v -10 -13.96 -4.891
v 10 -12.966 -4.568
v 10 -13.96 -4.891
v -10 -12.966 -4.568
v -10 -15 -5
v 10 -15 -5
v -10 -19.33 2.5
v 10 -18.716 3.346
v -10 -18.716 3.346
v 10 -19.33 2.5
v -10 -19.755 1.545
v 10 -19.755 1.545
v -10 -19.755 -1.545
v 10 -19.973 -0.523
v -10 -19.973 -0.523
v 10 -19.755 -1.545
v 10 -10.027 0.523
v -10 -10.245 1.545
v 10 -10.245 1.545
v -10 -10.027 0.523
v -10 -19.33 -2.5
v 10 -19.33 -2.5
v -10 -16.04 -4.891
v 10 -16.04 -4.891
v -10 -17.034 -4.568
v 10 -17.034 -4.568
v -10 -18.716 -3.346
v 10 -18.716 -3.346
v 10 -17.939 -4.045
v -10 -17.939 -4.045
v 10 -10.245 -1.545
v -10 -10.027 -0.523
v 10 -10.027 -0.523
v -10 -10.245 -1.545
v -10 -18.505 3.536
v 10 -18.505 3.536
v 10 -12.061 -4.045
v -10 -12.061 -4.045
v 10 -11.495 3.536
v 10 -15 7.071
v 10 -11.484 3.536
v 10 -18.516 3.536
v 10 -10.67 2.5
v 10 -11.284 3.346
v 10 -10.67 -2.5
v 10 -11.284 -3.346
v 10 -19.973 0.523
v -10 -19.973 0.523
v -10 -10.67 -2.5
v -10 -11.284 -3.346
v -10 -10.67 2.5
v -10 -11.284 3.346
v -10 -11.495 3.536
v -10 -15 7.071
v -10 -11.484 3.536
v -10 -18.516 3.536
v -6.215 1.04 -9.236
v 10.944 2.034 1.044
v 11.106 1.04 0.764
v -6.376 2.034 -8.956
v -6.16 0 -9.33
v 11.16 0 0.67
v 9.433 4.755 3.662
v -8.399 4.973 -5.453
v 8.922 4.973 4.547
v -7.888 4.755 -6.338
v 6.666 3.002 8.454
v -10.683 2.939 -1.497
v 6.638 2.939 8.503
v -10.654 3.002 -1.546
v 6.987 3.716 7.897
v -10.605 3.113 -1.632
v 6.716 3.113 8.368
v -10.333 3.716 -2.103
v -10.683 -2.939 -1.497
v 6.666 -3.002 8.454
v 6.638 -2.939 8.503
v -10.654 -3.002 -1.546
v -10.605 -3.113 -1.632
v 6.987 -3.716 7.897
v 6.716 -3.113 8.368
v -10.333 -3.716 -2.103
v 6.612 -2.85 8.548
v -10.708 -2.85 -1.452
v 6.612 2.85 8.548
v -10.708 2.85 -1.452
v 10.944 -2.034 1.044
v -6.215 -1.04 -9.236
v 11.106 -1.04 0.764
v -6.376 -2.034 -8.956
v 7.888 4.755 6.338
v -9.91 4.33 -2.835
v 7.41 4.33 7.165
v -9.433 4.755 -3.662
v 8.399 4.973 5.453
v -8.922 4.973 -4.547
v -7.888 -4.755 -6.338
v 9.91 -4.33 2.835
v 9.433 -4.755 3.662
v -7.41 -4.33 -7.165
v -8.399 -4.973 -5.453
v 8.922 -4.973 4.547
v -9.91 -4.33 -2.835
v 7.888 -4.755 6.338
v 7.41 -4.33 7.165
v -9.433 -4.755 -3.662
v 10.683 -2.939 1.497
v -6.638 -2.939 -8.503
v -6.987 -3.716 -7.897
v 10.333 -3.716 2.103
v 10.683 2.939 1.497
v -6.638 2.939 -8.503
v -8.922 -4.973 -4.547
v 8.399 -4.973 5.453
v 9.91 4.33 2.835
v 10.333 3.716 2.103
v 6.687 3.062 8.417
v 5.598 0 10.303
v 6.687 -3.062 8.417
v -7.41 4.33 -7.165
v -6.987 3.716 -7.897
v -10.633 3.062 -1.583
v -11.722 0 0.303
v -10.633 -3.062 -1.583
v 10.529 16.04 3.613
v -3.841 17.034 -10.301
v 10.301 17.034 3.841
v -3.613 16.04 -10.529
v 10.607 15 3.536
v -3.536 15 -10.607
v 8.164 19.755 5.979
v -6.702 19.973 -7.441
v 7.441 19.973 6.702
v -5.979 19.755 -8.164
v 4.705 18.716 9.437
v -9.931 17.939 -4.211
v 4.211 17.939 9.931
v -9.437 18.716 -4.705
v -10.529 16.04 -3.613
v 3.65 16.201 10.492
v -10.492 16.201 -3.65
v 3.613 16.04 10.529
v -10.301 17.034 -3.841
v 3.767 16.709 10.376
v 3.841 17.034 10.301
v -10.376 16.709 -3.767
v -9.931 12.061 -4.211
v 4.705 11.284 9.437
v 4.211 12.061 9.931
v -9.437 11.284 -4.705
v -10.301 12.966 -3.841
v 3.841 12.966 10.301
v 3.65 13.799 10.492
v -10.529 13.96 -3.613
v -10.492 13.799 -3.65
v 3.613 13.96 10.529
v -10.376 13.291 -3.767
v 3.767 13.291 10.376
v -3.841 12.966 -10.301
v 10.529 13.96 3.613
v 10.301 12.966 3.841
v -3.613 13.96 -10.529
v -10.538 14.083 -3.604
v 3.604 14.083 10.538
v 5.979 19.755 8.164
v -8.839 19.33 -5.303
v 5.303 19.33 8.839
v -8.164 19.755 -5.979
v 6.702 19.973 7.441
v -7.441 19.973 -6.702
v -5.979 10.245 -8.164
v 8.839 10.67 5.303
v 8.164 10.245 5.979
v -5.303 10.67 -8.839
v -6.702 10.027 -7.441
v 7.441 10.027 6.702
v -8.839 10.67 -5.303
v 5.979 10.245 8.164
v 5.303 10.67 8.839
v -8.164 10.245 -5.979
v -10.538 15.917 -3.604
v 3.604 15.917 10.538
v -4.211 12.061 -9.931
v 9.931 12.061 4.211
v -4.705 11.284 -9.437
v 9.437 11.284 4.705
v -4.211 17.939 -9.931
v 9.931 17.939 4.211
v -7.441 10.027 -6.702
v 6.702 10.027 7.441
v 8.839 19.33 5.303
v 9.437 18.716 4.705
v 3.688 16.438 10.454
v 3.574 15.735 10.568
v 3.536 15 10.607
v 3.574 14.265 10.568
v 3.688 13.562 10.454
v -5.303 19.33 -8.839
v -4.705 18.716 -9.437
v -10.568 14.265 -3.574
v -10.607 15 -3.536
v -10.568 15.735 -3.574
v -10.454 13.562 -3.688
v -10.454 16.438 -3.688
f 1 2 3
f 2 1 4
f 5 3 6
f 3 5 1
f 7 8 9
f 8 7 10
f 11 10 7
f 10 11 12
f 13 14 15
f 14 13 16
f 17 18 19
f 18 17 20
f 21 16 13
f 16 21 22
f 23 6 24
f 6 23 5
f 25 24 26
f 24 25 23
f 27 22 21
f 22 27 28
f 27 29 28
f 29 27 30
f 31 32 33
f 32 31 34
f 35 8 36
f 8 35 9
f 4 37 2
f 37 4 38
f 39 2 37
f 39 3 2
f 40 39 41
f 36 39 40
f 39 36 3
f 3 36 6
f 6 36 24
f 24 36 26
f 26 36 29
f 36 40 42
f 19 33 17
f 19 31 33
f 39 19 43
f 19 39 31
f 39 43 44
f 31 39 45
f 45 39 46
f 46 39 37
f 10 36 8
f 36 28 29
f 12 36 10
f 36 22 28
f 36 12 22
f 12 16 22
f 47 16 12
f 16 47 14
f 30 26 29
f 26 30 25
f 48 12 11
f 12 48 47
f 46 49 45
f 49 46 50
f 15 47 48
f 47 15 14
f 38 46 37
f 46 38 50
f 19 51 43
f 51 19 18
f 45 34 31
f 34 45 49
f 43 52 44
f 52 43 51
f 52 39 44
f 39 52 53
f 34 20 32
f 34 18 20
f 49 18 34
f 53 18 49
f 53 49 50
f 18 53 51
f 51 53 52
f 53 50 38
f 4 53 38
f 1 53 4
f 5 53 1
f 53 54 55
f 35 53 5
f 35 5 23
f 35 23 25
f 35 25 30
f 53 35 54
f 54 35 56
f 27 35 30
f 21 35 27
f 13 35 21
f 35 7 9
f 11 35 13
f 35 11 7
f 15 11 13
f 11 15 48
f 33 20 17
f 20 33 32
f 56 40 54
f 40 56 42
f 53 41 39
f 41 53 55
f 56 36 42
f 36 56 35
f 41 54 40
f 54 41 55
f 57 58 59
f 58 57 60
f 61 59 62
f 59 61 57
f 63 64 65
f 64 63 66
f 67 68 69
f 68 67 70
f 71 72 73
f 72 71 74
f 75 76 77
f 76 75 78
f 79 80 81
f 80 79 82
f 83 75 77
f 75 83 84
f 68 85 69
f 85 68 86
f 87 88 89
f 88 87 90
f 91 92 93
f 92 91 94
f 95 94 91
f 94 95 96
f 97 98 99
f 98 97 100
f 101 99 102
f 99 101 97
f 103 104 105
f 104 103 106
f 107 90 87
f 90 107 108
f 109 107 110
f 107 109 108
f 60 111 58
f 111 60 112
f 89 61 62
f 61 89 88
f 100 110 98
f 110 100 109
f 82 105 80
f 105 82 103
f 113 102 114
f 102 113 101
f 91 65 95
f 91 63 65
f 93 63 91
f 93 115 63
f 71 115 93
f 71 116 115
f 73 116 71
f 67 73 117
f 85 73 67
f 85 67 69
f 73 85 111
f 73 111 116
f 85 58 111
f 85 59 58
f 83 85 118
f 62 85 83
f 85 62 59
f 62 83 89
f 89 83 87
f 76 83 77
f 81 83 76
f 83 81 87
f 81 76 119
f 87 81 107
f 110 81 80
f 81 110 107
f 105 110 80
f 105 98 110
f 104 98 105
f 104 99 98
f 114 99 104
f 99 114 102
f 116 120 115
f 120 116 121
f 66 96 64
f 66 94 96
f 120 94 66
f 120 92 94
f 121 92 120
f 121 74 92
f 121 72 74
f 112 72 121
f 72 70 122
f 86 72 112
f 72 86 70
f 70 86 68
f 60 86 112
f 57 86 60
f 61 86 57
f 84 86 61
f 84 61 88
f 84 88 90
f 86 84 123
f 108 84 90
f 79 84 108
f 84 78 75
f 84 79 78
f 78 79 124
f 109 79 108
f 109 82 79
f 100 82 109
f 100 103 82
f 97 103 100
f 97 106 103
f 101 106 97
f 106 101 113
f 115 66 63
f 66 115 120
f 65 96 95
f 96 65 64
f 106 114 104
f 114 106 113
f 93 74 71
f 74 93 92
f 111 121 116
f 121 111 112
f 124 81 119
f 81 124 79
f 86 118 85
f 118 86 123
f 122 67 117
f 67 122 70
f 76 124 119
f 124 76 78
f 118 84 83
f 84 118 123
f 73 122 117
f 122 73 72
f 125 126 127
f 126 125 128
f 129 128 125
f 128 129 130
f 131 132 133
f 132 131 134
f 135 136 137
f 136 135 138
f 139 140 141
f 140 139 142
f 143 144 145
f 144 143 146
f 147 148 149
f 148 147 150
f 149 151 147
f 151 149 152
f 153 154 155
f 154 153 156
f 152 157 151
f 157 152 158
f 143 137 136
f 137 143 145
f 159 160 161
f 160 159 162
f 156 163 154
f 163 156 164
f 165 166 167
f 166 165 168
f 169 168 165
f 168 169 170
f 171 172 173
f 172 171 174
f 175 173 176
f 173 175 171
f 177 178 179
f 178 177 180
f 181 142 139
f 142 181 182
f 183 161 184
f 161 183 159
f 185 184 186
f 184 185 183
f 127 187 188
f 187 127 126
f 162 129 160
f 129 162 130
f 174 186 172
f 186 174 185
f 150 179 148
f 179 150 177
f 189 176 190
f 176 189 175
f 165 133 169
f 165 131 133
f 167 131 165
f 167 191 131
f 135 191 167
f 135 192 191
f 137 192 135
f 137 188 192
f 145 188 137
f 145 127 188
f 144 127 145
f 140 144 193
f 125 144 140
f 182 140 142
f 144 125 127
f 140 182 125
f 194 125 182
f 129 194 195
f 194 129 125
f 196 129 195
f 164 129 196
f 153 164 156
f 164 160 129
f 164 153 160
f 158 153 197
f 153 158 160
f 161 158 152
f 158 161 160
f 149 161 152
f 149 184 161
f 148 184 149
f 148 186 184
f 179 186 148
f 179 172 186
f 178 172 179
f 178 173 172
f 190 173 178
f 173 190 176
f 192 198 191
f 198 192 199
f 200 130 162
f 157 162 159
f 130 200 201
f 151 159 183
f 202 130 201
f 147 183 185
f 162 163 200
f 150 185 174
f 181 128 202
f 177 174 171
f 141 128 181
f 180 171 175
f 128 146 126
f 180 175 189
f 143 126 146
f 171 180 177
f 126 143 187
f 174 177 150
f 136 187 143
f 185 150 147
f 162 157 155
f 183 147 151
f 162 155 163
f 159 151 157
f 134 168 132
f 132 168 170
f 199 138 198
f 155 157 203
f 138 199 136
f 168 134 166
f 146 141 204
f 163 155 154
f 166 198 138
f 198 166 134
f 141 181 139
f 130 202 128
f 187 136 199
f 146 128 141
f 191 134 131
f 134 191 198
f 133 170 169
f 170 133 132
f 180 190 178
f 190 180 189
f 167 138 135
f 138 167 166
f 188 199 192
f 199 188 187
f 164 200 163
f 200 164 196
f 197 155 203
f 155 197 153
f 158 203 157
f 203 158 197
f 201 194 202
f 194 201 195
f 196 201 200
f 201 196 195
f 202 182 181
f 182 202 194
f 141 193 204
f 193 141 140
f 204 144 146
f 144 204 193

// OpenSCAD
/* From http://www.thingiverse.com/thing:3457
   © 2010 whosawhatsis

   This program is free software: you can redistribute it and/or modify
   it under the terms of the GNU Lesser General Public License as published by
   the Free Software Foundation, either version 3 of the License, or
   (at your option) any later version.

   This program is distributed in the hope that it will be useful,
   but WITHOUT ANY WARRANTY; without even the implied warranty of
   MERCHANTABILITY or FITNESS FOR A PARTICULAR PURPOSE. See the
   GNU Lesser General Public License for more details.

   You should have received a copy of the GNU Lesser General Public License
   along with this program. If not, see <http://www.gnu.org/licenses/>.
*/


/*
This script generates a teardrop shape at the appropriate angle to prevent overhangs greater than 45 degrees. The angle is in degrees, and is a rotation around the Y axis. You can then rotate around Z to point it in any direction. Rotation around X or Y will cause the angle to be wrong.
*/

module teardrop(radius, length, angle) {
	rotate([0, angle, 0]) union() {
		linear_extrude(height = length, center = true, convexity = radius, twist = 0)
			circle(r = radius, center = true, $fn = 30);
		linear_extrude(height = length, center = true, convexity = radius, twist = 0)
			projection(cut = false) rotate([0, -angle, 0]) translate([0, 0, radius * sin(45) * 1.5]) cylinder(h = radius * sin(45), r1 = radius * sin(45), r2 = 0, center = true, $fn = 30);
	}
		
	//I worked this portion out when a bug was causing the projection above to take FOREVER to calculate. It works as a replacement, and I figured I'd leave it here just in case.
	/*
		#polygon(points = [[radius * cos(-angle / 2), radius * sin(-angle / 2), 0],[radius * cos(-angle / 2), radius * -sin(-angle / 2), 0],[(sin(-angle - 45) + cos(-angle - 45)) * radius, 0, 0]], paths = [[0, 1, 2]]);
		#polygon(points = [[radius * -cos(-angle / 2), radius * sin(-angle / 2), 0],[radius * -cos(-angle / 2), radius * -sin(-angle / 2), 0],[(sin(-angle - 45) + cos(-angle - 45)) * radius, 0, 0]], paths = [[0, 1, 2]]);
		#polygon(points = [[radius * sin(-angle / 2), radius * cos(-angle / 2), 0],[radius * sin(-angle / 2), radius * -cos(-angle / 2), 0],[(sin(-angle - 45) + cos(-angle - 45)) * radius, 0, 0]], paths = [[0, 1, 2]]);
	*/
}

module test_teardrop(){
    translate([0, -15, 0]) teardrop(5, 20, 90);
    translate([0, 0, 0]) teardrop(5, 20, 60);
    translate([0, 15, 0]) teardrop(5, 20, 45);
}

test_teardrop();
